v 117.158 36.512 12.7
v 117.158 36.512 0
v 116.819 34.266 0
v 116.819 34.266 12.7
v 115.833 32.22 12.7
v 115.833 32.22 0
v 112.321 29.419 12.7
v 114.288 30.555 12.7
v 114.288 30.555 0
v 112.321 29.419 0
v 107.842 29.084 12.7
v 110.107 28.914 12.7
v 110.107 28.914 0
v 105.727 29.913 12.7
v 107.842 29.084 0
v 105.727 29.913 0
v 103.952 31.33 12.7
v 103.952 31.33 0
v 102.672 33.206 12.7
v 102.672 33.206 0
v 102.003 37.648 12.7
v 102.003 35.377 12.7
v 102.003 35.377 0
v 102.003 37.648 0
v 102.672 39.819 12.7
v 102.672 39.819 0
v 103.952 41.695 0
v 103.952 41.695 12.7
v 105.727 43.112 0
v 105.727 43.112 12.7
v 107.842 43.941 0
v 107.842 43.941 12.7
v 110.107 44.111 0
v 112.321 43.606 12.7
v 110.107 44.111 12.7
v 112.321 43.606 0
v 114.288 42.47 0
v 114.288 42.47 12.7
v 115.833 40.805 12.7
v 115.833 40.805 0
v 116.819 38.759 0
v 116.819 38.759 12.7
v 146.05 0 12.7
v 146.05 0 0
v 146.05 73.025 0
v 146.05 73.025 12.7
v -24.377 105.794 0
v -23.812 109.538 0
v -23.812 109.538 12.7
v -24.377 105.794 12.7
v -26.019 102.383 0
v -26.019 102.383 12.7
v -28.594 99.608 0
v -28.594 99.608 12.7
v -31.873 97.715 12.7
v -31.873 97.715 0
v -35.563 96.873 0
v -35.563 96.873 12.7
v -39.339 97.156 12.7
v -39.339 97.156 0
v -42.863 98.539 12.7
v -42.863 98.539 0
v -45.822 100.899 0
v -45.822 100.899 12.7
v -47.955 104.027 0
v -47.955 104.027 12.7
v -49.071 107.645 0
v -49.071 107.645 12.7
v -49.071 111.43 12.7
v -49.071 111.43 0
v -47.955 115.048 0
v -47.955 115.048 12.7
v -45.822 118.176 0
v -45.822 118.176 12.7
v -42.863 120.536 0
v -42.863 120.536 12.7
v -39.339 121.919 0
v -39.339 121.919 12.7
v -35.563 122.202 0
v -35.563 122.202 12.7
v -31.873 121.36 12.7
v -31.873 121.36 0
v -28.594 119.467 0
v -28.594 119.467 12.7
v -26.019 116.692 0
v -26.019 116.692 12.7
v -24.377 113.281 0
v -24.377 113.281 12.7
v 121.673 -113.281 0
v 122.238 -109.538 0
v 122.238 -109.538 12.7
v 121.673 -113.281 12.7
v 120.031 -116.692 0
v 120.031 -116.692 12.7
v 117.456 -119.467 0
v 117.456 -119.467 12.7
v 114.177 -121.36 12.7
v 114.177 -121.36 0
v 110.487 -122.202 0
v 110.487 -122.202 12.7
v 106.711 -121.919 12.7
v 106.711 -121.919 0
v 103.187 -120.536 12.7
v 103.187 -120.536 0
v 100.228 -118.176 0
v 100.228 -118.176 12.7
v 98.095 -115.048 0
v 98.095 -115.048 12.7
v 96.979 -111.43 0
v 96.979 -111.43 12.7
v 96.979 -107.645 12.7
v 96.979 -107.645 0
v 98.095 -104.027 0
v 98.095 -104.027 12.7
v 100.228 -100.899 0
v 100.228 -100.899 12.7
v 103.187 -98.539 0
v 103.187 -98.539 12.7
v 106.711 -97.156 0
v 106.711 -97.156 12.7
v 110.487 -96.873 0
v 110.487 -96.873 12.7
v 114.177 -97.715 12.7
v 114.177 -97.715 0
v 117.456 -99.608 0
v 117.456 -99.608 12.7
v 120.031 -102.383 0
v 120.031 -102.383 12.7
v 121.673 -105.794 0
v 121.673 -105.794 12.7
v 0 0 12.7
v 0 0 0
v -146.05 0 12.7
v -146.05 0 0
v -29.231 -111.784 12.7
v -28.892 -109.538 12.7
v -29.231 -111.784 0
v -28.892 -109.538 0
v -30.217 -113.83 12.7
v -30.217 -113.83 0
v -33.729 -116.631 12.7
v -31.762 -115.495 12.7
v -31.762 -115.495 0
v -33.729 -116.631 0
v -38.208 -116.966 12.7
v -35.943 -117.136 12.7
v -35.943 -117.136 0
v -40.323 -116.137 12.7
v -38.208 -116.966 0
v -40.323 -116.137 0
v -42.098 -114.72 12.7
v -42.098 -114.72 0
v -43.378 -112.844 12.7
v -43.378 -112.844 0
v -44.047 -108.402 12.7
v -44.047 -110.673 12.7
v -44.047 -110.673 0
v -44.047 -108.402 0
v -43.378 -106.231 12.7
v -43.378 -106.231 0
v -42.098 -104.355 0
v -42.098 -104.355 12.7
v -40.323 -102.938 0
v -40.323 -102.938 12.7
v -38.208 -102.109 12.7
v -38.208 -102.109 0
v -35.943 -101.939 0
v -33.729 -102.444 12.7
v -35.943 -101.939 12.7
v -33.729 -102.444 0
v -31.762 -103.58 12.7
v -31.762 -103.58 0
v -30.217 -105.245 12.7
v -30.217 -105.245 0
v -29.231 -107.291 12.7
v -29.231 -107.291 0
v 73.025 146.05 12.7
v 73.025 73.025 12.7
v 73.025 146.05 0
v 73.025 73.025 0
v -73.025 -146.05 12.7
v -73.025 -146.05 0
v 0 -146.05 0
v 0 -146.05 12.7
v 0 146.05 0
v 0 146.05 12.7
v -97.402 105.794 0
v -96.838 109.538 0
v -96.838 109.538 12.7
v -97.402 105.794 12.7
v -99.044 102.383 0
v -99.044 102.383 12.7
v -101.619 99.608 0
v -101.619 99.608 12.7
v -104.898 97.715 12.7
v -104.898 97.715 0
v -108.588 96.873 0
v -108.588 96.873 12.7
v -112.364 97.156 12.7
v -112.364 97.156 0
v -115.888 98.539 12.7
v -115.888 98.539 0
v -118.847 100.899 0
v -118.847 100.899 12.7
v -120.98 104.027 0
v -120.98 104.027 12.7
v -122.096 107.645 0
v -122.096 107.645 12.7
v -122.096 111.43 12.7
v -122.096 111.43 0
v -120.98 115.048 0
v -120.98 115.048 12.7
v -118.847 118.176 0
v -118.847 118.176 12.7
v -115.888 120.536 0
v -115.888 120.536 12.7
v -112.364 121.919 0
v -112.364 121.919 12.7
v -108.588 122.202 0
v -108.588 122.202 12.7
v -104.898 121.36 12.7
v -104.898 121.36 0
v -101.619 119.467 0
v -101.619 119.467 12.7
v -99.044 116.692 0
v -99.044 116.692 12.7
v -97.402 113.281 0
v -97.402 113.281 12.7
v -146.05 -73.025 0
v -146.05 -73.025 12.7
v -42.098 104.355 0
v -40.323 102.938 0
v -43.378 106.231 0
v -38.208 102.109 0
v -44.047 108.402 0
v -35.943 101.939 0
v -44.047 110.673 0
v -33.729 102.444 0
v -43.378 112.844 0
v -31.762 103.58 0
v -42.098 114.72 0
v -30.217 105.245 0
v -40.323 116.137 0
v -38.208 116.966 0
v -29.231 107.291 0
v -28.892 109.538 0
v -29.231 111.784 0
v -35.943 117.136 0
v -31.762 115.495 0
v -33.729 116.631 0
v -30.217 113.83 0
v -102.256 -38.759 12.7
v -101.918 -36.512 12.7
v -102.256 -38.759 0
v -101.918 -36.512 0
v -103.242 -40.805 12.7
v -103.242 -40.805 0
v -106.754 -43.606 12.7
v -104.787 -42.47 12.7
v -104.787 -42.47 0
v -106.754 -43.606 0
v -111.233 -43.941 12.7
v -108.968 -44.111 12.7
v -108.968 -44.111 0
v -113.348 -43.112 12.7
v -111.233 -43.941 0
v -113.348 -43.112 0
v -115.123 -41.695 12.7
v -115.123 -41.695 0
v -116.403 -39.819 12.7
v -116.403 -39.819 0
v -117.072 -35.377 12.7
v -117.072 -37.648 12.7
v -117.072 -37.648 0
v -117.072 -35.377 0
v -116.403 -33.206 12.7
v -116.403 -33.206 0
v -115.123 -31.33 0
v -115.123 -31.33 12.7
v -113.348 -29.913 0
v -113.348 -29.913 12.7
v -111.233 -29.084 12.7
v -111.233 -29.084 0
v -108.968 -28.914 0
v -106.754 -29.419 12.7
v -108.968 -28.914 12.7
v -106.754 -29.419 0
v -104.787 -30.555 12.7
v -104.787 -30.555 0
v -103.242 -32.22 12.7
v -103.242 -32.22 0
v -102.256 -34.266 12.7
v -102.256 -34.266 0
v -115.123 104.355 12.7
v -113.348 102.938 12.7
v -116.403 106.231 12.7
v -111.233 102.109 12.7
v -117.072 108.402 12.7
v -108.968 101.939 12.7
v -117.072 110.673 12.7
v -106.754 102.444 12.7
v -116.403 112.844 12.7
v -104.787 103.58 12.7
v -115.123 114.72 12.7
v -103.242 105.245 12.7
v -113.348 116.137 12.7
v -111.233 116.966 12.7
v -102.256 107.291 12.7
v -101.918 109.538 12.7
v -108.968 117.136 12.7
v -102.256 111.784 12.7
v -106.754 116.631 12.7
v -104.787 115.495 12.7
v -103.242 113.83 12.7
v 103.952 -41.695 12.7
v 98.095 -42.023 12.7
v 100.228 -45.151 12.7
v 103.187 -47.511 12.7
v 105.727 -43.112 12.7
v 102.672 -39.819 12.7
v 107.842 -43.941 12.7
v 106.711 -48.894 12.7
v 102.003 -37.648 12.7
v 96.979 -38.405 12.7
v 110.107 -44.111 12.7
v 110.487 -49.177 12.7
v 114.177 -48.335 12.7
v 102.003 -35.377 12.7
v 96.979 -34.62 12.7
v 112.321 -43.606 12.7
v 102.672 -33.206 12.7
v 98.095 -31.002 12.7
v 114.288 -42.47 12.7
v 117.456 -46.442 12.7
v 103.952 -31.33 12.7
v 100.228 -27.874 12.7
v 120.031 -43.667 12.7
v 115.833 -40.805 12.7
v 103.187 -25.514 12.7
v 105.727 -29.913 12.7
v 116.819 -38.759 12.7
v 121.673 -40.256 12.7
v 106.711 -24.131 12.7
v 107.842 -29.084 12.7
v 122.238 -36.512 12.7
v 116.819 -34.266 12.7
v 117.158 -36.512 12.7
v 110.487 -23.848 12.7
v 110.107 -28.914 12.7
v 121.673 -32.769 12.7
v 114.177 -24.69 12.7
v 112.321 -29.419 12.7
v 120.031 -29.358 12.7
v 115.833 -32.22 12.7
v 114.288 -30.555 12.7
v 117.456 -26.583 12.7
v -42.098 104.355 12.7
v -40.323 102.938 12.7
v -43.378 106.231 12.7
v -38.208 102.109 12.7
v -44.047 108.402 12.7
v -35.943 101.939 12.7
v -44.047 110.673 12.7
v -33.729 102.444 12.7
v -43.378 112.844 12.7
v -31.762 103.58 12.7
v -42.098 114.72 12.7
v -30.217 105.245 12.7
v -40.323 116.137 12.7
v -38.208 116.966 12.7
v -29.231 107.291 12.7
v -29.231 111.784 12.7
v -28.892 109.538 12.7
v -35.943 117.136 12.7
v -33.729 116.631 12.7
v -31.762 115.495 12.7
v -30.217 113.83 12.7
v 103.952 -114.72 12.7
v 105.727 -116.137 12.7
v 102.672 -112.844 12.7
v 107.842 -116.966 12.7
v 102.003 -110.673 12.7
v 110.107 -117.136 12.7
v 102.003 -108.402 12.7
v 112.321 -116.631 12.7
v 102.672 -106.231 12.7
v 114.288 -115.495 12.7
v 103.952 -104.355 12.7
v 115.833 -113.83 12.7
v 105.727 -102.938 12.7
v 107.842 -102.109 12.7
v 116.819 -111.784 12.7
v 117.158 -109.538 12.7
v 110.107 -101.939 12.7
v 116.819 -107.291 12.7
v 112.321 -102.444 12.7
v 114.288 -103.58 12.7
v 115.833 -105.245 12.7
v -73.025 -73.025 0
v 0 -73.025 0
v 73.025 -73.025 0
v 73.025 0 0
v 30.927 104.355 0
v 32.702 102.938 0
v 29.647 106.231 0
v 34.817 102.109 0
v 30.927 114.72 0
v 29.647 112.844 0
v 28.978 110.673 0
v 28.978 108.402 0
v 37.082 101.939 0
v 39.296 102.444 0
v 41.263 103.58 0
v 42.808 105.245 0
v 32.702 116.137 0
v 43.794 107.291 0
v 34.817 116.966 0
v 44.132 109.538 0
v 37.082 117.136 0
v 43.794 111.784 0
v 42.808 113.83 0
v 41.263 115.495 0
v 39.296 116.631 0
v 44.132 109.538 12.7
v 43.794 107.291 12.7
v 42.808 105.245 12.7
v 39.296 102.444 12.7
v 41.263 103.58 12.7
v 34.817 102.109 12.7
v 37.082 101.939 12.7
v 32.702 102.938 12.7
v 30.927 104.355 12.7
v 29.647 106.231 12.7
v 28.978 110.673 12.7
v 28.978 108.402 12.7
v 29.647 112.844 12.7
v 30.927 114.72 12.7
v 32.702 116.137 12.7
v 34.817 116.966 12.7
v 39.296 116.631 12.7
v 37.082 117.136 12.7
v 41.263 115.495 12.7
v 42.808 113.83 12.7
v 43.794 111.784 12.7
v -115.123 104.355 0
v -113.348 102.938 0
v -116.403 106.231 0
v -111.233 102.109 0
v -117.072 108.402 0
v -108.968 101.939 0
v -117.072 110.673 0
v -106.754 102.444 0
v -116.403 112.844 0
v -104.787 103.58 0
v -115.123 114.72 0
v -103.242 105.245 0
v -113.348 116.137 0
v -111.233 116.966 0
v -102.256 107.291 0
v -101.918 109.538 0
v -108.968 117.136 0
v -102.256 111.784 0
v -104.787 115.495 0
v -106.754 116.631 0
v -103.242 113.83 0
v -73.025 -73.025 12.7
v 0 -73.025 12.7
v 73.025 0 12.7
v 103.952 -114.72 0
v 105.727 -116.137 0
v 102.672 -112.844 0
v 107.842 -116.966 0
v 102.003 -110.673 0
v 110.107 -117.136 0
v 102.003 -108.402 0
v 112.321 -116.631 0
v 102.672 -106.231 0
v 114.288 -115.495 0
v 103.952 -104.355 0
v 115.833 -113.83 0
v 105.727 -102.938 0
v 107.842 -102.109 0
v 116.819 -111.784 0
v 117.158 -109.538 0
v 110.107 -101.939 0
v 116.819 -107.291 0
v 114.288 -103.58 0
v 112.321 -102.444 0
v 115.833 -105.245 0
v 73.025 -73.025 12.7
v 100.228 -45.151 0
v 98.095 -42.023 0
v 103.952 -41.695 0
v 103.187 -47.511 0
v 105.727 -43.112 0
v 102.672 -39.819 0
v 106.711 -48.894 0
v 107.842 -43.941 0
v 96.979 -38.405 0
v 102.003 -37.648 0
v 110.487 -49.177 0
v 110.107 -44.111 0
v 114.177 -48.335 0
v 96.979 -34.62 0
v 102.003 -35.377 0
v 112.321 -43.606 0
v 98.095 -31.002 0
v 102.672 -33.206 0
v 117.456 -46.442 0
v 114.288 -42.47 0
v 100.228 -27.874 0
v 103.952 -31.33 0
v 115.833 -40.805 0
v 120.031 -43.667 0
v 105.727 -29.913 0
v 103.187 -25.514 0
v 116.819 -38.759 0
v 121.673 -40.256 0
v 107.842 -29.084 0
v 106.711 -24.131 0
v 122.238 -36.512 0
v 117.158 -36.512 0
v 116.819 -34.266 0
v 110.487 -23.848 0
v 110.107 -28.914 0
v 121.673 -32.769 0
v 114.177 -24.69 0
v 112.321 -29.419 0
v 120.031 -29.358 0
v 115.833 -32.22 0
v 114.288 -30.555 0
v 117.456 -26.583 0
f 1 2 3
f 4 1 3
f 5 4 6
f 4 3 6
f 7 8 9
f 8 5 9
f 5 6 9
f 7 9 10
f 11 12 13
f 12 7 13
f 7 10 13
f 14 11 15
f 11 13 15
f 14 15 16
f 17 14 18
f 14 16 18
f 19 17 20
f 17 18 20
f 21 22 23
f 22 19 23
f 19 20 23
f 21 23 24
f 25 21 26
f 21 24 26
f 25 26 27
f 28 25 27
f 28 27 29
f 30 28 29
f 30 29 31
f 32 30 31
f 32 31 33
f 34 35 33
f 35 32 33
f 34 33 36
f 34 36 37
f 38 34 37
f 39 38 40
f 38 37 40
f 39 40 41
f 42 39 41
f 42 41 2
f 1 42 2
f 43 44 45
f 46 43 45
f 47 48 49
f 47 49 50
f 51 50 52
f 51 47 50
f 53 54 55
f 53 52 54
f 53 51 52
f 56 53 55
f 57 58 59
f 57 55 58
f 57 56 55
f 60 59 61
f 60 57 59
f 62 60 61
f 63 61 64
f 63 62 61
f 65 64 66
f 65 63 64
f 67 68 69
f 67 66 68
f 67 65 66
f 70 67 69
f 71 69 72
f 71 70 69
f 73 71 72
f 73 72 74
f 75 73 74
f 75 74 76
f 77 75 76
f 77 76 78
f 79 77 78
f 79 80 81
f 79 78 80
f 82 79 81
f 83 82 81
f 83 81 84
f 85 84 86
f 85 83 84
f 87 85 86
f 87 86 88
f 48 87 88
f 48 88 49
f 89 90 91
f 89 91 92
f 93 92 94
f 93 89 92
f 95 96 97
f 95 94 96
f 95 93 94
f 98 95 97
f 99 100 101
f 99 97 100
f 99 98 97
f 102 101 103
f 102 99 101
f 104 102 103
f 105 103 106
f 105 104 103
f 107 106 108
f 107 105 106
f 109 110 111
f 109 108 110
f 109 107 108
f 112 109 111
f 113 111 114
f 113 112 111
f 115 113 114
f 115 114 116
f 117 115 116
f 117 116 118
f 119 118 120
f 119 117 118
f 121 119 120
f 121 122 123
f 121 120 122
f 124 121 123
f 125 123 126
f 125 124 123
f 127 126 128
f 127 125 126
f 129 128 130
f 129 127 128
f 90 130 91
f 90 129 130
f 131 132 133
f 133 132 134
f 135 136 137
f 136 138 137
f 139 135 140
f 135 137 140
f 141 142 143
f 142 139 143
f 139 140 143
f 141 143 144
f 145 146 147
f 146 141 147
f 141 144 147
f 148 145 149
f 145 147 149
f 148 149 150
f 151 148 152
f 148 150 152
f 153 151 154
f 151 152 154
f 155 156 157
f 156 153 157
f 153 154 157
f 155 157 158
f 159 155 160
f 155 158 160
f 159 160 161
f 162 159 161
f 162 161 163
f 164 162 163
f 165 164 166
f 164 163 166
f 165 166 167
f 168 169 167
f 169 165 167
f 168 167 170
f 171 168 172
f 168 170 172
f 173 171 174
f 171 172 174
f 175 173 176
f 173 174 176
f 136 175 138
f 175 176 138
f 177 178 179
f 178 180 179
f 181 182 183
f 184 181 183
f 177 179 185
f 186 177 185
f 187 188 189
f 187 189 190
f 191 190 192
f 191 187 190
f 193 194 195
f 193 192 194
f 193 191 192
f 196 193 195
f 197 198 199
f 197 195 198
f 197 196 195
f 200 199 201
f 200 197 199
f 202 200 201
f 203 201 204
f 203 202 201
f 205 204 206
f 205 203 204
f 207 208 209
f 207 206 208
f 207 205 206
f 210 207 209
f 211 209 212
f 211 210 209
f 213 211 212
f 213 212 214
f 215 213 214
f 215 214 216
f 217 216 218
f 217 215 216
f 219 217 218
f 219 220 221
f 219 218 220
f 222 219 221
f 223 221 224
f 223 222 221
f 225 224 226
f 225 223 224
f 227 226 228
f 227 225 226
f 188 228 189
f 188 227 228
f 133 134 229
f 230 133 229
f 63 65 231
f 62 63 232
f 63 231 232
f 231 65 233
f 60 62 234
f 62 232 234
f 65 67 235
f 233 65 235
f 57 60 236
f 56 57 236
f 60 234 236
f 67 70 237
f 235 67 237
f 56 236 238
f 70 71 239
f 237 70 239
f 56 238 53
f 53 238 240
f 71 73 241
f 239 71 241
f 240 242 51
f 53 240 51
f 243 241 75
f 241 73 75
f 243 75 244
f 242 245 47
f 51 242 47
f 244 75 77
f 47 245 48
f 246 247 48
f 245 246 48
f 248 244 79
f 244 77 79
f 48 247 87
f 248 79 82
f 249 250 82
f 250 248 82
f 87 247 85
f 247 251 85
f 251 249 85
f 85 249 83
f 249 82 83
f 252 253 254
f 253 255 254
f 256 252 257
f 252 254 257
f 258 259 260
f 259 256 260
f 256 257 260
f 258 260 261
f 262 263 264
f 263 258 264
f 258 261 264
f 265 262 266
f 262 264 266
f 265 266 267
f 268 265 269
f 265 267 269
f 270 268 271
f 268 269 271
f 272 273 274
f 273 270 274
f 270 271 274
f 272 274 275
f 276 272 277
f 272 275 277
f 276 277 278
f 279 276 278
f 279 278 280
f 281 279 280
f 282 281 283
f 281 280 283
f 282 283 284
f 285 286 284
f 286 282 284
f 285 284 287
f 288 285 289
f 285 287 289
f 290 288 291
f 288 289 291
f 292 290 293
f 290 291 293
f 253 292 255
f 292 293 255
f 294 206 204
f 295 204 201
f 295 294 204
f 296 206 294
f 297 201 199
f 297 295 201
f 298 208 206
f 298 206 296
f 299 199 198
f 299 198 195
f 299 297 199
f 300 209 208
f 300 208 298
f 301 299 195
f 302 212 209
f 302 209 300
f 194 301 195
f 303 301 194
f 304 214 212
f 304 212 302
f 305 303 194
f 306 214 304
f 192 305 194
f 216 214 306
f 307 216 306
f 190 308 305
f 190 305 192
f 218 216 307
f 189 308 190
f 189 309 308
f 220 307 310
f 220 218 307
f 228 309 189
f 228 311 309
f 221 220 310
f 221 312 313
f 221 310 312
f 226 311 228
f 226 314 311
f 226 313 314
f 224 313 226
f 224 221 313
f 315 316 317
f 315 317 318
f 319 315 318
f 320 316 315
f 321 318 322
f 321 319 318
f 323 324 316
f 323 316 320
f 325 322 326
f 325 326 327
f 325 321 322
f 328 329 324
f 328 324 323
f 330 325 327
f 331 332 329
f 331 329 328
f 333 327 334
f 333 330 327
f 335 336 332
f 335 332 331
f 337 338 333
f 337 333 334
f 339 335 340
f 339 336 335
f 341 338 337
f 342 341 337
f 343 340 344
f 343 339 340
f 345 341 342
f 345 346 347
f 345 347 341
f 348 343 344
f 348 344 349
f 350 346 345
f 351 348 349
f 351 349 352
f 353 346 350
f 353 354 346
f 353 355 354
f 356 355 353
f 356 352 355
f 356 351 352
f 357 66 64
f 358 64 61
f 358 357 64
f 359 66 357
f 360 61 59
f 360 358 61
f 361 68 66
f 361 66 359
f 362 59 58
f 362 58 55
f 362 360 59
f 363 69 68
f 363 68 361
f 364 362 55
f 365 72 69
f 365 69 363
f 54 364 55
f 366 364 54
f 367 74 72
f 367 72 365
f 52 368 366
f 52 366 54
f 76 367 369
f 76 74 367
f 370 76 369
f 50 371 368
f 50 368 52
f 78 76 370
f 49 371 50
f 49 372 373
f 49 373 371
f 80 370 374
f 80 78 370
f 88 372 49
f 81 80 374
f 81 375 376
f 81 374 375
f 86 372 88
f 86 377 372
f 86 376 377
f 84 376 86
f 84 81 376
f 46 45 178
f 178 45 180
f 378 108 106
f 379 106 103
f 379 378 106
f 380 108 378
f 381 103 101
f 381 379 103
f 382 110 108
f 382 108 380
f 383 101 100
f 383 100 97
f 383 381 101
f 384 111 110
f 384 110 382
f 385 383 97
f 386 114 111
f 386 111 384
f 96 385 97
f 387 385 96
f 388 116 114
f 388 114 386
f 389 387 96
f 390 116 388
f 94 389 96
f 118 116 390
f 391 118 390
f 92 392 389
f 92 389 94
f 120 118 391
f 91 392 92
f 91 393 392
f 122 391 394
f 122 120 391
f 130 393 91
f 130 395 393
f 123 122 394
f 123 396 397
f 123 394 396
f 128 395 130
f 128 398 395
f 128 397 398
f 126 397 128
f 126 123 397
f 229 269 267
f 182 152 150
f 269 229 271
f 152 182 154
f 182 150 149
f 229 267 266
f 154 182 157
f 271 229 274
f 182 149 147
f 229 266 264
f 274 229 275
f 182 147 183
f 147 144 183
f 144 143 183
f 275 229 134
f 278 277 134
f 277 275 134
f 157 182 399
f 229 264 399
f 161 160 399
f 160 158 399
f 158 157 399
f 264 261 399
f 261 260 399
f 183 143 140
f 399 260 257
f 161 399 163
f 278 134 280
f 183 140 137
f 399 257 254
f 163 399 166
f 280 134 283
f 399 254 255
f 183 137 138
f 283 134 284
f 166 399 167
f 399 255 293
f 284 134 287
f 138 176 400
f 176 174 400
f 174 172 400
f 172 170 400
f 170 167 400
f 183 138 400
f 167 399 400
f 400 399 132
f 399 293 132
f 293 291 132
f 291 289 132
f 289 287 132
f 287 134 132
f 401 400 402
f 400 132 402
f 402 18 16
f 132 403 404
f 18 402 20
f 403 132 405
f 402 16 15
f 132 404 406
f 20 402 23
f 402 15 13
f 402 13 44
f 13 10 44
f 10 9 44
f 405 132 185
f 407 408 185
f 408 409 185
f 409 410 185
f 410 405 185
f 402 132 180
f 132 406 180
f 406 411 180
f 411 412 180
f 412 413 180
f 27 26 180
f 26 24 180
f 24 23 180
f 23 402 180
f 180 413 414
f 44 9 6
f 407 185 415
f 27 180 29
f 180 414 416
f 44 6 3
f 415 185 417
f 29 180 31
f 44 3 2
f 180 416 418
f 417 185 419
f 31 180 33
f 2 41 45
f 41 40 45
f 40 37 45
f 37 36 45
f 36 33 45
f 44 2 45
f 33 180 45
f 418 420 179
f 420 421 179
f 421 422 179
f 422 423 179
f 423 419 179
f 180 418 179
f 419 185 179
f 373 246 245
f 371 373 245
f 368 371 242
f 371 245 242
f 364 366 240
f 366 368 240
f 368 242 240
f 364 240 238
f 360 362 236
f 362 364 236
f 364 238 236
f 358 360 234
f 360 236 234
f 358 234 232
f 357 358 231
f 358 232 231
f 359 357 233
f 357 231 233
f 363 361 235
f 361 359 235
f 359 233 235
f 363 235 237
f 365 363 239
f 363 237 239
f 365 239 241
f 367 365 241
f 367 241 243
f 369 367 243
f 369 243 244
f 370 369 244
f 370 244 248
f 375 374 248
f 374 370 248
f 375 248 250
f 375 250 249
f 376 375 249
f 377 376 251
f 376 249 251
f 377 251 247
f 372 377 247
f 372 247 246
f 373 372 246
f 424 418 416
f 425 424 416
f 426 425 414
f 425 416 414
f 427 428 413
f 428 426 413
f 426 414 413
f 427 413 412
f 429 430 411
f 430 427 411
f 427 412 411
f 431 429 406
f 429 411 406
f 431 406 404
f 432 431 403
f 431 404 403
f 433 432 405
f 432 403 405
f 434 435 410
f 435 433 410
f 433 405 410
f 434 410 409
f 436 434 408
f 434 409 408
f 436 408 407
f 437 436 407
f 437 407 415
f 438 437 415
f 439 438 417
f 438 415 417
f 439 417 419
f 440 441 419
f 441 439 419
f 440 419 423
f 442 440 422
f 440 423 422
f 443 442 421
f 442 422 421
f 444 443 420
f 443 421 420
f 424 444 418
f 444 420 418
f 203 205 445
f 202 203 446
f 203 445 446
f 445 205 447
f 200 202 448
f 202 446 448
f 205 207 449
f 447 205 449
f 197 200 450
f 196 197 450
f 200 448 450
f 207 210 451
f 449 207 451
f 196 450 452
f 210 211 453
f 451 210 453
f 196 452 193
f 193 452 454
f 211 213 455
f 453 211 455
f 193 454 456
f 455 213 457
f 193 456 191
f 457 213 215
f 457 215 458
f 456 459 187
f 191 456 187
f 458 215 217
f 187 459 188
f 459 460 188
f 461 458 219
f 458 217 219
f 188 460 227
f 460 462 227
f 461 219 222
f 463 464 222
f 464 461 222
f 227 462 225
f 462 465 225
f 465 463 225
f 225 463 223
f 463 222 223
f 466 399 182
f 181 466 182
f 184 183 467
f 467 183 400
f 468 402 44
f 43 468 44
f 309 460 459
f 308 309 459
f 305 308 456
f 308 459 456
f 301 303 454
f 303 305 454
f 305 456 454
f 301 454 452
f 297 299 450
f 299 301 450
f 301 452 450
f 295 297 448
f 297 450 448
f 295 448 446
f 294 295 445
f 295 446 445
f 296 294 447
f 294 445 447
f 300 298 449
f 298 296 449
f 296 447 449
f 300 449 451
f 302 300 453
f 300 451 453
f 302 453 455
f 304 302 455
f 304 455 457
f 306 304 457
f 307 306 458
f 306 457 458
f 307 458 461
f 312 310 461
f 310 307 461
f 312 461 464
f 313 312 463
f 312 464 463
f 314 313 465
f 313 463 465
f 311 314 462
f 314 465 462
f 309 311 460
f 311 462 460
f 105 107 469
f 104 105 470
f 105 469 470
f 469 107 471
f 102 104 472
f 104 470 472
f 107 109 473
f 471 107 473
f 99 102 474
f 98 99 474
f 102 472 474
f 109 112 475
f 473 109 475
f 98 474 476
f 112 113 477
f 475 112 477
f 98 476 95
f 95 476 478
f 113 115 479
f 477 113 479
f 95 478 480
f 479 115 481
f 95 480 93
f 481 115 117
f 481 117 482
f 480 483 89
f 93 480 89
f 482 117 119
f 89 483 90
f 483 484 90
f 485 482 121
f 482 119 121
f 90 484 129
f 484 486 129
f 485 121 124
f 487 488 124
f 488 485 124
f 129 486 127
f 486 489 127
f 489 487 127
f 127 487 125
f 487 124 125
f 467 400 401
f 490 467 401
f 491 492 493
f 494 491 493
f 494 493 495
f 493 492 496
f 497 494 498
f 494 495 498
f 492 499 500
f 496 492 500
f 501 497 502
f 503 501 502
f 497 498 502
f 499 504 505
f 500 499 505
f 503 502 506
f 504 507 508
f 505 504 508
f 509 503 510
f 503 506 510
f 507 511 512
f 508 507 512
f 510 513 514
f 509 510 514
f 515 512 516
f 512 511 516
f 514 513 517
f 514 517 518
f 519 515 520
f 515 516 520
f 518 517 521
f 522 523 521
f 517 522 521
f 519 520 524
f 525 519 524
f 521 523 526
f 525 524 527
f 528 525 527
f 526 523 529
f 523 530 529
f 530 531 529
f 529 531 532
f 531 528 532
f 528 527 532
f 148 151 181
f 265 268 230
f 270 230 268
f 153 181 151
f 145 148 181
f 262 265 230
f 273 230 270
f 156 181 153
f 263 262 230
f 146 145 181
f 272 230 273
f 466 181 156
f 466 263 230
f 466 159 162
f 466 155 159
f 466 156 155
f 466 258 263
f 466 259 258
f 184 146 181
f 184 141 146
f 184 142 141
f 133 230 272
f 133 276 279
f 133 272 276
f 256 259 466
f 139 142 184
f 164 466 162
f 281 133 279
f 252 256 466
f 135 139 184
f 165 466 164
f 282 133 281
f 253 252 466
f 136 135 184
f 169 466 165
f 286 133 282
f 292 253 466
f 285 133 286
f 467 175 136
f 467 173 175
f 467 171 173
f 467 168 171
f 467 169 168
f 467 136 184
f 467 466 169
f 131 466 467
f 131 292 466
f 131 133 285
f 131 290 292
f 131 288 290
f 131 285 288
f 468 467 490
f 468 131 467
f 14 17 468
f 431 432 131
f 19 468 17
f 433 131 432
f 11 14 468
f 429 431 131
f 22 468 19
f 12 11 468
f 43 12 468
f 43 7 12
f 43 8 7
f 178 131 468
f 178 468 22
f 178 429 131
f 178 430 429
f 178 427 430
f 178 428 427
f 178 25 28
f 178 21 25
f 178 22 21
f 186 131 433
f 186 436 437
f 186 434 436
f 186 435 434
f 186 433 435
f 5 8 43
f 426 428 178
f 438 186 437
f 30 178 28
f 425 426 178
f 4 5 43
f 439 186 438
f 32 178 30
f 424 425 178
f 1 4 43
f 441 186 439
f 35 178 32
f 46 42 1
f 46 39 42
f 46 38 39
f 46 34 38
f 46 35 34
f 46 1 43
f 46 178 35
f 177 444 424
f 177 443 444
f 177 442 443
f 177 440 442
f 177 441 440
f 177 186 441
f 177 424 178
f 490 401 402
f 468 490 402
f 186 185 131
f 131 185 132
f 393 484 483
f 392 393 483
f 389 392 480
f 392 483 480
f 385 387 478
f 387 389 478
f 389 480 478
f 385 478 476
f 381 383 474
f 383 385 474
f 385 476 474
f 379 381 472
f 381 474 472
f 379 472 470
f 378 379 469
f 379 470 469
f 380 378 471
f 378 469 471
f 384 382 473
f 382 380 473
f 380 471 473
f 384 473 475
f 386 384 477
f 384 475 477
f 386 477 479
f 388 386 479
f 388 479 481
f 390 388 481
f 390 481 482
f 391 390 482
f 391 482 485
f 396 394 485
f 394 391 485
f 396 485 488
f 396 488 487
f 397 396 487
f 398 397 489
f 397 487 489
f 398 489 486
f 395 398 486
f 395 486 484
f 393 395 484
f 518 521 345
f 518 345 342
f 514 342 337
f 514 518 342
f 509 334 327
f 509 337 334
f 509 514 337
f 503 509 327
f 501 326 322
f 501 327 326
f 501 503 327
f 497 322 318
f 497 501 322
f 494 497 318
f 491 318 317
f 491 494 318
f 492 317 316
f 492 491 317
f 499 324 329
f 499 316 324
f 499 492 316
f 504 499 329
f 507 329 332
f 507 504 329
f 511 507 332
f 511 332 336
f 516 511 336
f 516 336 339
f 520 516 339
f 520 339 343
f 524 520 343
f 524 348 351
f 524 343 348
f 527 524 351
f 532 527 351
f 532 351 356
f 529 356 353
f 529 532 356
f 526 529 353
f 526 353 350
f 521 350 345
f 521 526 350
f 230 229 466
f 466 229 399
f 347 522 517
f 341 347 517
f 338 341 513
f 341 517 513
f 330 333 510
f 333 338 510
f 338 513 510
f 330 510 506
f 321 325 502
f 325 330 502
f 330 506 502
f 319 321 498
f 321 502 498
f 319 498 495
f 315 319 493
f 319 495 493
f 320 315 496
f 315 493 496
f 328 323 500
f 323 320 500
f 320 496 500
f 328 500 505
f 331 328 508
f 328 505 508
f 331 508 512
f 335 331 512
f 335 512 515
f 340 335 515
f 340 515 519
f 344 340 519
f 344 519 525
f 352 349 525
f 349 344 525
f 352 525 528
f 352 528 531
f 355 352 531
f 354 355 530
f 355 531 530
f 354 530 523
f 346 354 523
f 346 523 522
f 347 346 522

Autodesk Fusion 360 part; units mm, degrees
sketch "Sketch1" plane through (0, 0, 0) normal (0, 0, 1) x (1, 0, 0)
  line L0 (146.05, -146.05) -> (-146.05, -146.05) construction
  line L1 (-146.05, -146.05) -> (-146.05, 146.05) construction
  line L2 (-146.05, 146.05) -> (146.05, 146.05) construction
  line L3 (146.05, 146.05) -> (146.05, -146.05) construction
  line L4 (146.05, -146.05) -> (-146.05, 146.05) construction
  line L5 (-146.05, -146.05) -> (146.05, 146.05) construction
  line L6 (0, -146.05) -> (0, 0) construction
  line L7 (0, 0) -> (0, 146.05) construction
  line L8 (0, 0) -> (-146.05, 0)
  line L9 (0, 0) -> (146.05, 0) construction
  line L10 (-73.025, 0) -> (-73.025, -146.05) construction
  line L11 (73.025, 0) -> (73.025, -146.05) construction
  line L12 (73.025, 0) -> (73.025, 146.05) construction
  line L13 (-73.025, 0) -> (-73.025, 146.05) construction
  line L14 (0, -73.025) -> (146.05, -73.025) construction
  line L15 (0, -73.025) -> (-146.05, -73.025) construction
  line L16 (0, 73.025) -> (-146.05, 73.025) construction
  line L17 (0, 73.025) -> (146.05, 73.025) construction
  line L18 (-146.05, 73.025) -> (-146.05, -73.025)
  line L19 (-146.05, -73.025) -> (-73.025, -73.025)
  line L20 (-73.025, -73.025) -> (-73.025, -146.05)
  line L21 (-73.025, -146.05) -> (0, -146.05)
  line L22 (0, -146.05) -> (0, -73.025)
  line L23 (0, -73.025) -> (73.025, -73.025)
  line L24 (73.025, -73.025) -> (73.025, 0)
  line L25 (73.025, 0) -> (146.05, 0)
  line L26 (146.05, 0) -> (146.05, 73.025)
  line L27 (146.05, 73.025) -> (73.025, 73.025)
  line L28 (73.025, 73.025) -> (73.025, 146.05)
  line L29 (73.025, 146.05) -> (0, 146.05)
  line L30 (0, 146.05) -> (0, 73.025)
  line L31 (0, 73.025) -> (0, 0)
  line L32 (0, 0) -> (-73.025, 0)
  line L33 (-73.025, 0) -> (-73.025, 73.025)
  line L34 (-73.025, 73.025) -> (-146.05, 73.025)
  line L35 (73.025, 109.5375) -> (0, 109.5375) construction
  line L36 (36.5125, 146.05) -> (36.5125, 109.5375) construction
  line L37 (109.5375, 73.025) -> (109.5375, 0) construction
  line L38 (146.05, 36.5125) -> (109.5375, 36.5125) construction
  line L39 (-73.025, -109.5375) -> (0, -109.5375) construction
  line L40 (-36.5125, -146.05) -> (-36.5125, -109.5375) construction
  line L41 (-109.5375, -73.025) -> (-109.5375, 0) construction
  line L42 (-146.05, -73.025) -> (-146.05, 0)
  line L43 (-146.05, -36.5125) -> (-109.5375, -36.5125) construction
  circle A0 centre (36.5125, 109.5375) radius 7.62
  circle A1 centre (109.5375, 36.5125) radius 7.62
  circle A2 centre (-109.5375, -36.5125) radius 7.62
  circle A3 centre (-36.5125, -109.5375) radius 7.62
  line L44 (0, 109.5375) -> (-146.05, 109.5375) construction
  line L45 (109.5375, 0) -> (109.5375, -146.05) construction
  line L46 (-73.025, 73.025) -> (0, 146.05) construction
  line L47 (73.025, -73.025) -> (146.05, 0) construction
  circle A4 centre (-36.5125, 109.5375) radius 12.7
  circle A5 centre (-109.5375, 109.5375) radius 12.7
  circle A6 centre (109.5375, -36.5125) radius 12.7
  circle A7 centre (109.5375, -109.5375) radius 12.7
  circle A8 centre (-109.5375, 109.5375) radius 7.62
  circle A9 centre (-36.5125, 109.5375) radius 7.62
  circle A10 centre (109.5375, -36.5125) radius 7.62
  circle A11 centre (109.5375, -109.5375) radius 7.62
  dimension "d1" = 292.1
  dimension "d2" = 292.1
  dimension "d3" = 15.24
  dimension "d4" = 15.24
  dimension "d5" = 15.24
  dimension "d6" = 15.24
  dimension "d7" = 25.4
  dimension "d8" = 25.4
  dimension "d9" = 25.4
  dimension "d10" = 25.4
  dimension "d11" = 15.24
  dimension "d12" = 15.24
  dimension "d13" = 15.24
  dimension "d14" = 15.24
extrude "Extrude1" add sketch "Sketch1" along normal blind 12.7 contours L8 L18 L19 L20 L21 L22 L23 L24 L25 L26 L27 L28 L29 L30 L31 L32 L42 | A4 | A5 | A6 | A7 makes body 1 at (-96.9006, 108.273, 8.4667) makes body 2 at (-23.8756, 108.273, 8.4667) makes body 3 at (122.1744, -37.777, 8.4667) makes body 4 at (-24.3417, -48.6833, 0) makes body 5 at (122.1744, -110.802, 8.4667)
